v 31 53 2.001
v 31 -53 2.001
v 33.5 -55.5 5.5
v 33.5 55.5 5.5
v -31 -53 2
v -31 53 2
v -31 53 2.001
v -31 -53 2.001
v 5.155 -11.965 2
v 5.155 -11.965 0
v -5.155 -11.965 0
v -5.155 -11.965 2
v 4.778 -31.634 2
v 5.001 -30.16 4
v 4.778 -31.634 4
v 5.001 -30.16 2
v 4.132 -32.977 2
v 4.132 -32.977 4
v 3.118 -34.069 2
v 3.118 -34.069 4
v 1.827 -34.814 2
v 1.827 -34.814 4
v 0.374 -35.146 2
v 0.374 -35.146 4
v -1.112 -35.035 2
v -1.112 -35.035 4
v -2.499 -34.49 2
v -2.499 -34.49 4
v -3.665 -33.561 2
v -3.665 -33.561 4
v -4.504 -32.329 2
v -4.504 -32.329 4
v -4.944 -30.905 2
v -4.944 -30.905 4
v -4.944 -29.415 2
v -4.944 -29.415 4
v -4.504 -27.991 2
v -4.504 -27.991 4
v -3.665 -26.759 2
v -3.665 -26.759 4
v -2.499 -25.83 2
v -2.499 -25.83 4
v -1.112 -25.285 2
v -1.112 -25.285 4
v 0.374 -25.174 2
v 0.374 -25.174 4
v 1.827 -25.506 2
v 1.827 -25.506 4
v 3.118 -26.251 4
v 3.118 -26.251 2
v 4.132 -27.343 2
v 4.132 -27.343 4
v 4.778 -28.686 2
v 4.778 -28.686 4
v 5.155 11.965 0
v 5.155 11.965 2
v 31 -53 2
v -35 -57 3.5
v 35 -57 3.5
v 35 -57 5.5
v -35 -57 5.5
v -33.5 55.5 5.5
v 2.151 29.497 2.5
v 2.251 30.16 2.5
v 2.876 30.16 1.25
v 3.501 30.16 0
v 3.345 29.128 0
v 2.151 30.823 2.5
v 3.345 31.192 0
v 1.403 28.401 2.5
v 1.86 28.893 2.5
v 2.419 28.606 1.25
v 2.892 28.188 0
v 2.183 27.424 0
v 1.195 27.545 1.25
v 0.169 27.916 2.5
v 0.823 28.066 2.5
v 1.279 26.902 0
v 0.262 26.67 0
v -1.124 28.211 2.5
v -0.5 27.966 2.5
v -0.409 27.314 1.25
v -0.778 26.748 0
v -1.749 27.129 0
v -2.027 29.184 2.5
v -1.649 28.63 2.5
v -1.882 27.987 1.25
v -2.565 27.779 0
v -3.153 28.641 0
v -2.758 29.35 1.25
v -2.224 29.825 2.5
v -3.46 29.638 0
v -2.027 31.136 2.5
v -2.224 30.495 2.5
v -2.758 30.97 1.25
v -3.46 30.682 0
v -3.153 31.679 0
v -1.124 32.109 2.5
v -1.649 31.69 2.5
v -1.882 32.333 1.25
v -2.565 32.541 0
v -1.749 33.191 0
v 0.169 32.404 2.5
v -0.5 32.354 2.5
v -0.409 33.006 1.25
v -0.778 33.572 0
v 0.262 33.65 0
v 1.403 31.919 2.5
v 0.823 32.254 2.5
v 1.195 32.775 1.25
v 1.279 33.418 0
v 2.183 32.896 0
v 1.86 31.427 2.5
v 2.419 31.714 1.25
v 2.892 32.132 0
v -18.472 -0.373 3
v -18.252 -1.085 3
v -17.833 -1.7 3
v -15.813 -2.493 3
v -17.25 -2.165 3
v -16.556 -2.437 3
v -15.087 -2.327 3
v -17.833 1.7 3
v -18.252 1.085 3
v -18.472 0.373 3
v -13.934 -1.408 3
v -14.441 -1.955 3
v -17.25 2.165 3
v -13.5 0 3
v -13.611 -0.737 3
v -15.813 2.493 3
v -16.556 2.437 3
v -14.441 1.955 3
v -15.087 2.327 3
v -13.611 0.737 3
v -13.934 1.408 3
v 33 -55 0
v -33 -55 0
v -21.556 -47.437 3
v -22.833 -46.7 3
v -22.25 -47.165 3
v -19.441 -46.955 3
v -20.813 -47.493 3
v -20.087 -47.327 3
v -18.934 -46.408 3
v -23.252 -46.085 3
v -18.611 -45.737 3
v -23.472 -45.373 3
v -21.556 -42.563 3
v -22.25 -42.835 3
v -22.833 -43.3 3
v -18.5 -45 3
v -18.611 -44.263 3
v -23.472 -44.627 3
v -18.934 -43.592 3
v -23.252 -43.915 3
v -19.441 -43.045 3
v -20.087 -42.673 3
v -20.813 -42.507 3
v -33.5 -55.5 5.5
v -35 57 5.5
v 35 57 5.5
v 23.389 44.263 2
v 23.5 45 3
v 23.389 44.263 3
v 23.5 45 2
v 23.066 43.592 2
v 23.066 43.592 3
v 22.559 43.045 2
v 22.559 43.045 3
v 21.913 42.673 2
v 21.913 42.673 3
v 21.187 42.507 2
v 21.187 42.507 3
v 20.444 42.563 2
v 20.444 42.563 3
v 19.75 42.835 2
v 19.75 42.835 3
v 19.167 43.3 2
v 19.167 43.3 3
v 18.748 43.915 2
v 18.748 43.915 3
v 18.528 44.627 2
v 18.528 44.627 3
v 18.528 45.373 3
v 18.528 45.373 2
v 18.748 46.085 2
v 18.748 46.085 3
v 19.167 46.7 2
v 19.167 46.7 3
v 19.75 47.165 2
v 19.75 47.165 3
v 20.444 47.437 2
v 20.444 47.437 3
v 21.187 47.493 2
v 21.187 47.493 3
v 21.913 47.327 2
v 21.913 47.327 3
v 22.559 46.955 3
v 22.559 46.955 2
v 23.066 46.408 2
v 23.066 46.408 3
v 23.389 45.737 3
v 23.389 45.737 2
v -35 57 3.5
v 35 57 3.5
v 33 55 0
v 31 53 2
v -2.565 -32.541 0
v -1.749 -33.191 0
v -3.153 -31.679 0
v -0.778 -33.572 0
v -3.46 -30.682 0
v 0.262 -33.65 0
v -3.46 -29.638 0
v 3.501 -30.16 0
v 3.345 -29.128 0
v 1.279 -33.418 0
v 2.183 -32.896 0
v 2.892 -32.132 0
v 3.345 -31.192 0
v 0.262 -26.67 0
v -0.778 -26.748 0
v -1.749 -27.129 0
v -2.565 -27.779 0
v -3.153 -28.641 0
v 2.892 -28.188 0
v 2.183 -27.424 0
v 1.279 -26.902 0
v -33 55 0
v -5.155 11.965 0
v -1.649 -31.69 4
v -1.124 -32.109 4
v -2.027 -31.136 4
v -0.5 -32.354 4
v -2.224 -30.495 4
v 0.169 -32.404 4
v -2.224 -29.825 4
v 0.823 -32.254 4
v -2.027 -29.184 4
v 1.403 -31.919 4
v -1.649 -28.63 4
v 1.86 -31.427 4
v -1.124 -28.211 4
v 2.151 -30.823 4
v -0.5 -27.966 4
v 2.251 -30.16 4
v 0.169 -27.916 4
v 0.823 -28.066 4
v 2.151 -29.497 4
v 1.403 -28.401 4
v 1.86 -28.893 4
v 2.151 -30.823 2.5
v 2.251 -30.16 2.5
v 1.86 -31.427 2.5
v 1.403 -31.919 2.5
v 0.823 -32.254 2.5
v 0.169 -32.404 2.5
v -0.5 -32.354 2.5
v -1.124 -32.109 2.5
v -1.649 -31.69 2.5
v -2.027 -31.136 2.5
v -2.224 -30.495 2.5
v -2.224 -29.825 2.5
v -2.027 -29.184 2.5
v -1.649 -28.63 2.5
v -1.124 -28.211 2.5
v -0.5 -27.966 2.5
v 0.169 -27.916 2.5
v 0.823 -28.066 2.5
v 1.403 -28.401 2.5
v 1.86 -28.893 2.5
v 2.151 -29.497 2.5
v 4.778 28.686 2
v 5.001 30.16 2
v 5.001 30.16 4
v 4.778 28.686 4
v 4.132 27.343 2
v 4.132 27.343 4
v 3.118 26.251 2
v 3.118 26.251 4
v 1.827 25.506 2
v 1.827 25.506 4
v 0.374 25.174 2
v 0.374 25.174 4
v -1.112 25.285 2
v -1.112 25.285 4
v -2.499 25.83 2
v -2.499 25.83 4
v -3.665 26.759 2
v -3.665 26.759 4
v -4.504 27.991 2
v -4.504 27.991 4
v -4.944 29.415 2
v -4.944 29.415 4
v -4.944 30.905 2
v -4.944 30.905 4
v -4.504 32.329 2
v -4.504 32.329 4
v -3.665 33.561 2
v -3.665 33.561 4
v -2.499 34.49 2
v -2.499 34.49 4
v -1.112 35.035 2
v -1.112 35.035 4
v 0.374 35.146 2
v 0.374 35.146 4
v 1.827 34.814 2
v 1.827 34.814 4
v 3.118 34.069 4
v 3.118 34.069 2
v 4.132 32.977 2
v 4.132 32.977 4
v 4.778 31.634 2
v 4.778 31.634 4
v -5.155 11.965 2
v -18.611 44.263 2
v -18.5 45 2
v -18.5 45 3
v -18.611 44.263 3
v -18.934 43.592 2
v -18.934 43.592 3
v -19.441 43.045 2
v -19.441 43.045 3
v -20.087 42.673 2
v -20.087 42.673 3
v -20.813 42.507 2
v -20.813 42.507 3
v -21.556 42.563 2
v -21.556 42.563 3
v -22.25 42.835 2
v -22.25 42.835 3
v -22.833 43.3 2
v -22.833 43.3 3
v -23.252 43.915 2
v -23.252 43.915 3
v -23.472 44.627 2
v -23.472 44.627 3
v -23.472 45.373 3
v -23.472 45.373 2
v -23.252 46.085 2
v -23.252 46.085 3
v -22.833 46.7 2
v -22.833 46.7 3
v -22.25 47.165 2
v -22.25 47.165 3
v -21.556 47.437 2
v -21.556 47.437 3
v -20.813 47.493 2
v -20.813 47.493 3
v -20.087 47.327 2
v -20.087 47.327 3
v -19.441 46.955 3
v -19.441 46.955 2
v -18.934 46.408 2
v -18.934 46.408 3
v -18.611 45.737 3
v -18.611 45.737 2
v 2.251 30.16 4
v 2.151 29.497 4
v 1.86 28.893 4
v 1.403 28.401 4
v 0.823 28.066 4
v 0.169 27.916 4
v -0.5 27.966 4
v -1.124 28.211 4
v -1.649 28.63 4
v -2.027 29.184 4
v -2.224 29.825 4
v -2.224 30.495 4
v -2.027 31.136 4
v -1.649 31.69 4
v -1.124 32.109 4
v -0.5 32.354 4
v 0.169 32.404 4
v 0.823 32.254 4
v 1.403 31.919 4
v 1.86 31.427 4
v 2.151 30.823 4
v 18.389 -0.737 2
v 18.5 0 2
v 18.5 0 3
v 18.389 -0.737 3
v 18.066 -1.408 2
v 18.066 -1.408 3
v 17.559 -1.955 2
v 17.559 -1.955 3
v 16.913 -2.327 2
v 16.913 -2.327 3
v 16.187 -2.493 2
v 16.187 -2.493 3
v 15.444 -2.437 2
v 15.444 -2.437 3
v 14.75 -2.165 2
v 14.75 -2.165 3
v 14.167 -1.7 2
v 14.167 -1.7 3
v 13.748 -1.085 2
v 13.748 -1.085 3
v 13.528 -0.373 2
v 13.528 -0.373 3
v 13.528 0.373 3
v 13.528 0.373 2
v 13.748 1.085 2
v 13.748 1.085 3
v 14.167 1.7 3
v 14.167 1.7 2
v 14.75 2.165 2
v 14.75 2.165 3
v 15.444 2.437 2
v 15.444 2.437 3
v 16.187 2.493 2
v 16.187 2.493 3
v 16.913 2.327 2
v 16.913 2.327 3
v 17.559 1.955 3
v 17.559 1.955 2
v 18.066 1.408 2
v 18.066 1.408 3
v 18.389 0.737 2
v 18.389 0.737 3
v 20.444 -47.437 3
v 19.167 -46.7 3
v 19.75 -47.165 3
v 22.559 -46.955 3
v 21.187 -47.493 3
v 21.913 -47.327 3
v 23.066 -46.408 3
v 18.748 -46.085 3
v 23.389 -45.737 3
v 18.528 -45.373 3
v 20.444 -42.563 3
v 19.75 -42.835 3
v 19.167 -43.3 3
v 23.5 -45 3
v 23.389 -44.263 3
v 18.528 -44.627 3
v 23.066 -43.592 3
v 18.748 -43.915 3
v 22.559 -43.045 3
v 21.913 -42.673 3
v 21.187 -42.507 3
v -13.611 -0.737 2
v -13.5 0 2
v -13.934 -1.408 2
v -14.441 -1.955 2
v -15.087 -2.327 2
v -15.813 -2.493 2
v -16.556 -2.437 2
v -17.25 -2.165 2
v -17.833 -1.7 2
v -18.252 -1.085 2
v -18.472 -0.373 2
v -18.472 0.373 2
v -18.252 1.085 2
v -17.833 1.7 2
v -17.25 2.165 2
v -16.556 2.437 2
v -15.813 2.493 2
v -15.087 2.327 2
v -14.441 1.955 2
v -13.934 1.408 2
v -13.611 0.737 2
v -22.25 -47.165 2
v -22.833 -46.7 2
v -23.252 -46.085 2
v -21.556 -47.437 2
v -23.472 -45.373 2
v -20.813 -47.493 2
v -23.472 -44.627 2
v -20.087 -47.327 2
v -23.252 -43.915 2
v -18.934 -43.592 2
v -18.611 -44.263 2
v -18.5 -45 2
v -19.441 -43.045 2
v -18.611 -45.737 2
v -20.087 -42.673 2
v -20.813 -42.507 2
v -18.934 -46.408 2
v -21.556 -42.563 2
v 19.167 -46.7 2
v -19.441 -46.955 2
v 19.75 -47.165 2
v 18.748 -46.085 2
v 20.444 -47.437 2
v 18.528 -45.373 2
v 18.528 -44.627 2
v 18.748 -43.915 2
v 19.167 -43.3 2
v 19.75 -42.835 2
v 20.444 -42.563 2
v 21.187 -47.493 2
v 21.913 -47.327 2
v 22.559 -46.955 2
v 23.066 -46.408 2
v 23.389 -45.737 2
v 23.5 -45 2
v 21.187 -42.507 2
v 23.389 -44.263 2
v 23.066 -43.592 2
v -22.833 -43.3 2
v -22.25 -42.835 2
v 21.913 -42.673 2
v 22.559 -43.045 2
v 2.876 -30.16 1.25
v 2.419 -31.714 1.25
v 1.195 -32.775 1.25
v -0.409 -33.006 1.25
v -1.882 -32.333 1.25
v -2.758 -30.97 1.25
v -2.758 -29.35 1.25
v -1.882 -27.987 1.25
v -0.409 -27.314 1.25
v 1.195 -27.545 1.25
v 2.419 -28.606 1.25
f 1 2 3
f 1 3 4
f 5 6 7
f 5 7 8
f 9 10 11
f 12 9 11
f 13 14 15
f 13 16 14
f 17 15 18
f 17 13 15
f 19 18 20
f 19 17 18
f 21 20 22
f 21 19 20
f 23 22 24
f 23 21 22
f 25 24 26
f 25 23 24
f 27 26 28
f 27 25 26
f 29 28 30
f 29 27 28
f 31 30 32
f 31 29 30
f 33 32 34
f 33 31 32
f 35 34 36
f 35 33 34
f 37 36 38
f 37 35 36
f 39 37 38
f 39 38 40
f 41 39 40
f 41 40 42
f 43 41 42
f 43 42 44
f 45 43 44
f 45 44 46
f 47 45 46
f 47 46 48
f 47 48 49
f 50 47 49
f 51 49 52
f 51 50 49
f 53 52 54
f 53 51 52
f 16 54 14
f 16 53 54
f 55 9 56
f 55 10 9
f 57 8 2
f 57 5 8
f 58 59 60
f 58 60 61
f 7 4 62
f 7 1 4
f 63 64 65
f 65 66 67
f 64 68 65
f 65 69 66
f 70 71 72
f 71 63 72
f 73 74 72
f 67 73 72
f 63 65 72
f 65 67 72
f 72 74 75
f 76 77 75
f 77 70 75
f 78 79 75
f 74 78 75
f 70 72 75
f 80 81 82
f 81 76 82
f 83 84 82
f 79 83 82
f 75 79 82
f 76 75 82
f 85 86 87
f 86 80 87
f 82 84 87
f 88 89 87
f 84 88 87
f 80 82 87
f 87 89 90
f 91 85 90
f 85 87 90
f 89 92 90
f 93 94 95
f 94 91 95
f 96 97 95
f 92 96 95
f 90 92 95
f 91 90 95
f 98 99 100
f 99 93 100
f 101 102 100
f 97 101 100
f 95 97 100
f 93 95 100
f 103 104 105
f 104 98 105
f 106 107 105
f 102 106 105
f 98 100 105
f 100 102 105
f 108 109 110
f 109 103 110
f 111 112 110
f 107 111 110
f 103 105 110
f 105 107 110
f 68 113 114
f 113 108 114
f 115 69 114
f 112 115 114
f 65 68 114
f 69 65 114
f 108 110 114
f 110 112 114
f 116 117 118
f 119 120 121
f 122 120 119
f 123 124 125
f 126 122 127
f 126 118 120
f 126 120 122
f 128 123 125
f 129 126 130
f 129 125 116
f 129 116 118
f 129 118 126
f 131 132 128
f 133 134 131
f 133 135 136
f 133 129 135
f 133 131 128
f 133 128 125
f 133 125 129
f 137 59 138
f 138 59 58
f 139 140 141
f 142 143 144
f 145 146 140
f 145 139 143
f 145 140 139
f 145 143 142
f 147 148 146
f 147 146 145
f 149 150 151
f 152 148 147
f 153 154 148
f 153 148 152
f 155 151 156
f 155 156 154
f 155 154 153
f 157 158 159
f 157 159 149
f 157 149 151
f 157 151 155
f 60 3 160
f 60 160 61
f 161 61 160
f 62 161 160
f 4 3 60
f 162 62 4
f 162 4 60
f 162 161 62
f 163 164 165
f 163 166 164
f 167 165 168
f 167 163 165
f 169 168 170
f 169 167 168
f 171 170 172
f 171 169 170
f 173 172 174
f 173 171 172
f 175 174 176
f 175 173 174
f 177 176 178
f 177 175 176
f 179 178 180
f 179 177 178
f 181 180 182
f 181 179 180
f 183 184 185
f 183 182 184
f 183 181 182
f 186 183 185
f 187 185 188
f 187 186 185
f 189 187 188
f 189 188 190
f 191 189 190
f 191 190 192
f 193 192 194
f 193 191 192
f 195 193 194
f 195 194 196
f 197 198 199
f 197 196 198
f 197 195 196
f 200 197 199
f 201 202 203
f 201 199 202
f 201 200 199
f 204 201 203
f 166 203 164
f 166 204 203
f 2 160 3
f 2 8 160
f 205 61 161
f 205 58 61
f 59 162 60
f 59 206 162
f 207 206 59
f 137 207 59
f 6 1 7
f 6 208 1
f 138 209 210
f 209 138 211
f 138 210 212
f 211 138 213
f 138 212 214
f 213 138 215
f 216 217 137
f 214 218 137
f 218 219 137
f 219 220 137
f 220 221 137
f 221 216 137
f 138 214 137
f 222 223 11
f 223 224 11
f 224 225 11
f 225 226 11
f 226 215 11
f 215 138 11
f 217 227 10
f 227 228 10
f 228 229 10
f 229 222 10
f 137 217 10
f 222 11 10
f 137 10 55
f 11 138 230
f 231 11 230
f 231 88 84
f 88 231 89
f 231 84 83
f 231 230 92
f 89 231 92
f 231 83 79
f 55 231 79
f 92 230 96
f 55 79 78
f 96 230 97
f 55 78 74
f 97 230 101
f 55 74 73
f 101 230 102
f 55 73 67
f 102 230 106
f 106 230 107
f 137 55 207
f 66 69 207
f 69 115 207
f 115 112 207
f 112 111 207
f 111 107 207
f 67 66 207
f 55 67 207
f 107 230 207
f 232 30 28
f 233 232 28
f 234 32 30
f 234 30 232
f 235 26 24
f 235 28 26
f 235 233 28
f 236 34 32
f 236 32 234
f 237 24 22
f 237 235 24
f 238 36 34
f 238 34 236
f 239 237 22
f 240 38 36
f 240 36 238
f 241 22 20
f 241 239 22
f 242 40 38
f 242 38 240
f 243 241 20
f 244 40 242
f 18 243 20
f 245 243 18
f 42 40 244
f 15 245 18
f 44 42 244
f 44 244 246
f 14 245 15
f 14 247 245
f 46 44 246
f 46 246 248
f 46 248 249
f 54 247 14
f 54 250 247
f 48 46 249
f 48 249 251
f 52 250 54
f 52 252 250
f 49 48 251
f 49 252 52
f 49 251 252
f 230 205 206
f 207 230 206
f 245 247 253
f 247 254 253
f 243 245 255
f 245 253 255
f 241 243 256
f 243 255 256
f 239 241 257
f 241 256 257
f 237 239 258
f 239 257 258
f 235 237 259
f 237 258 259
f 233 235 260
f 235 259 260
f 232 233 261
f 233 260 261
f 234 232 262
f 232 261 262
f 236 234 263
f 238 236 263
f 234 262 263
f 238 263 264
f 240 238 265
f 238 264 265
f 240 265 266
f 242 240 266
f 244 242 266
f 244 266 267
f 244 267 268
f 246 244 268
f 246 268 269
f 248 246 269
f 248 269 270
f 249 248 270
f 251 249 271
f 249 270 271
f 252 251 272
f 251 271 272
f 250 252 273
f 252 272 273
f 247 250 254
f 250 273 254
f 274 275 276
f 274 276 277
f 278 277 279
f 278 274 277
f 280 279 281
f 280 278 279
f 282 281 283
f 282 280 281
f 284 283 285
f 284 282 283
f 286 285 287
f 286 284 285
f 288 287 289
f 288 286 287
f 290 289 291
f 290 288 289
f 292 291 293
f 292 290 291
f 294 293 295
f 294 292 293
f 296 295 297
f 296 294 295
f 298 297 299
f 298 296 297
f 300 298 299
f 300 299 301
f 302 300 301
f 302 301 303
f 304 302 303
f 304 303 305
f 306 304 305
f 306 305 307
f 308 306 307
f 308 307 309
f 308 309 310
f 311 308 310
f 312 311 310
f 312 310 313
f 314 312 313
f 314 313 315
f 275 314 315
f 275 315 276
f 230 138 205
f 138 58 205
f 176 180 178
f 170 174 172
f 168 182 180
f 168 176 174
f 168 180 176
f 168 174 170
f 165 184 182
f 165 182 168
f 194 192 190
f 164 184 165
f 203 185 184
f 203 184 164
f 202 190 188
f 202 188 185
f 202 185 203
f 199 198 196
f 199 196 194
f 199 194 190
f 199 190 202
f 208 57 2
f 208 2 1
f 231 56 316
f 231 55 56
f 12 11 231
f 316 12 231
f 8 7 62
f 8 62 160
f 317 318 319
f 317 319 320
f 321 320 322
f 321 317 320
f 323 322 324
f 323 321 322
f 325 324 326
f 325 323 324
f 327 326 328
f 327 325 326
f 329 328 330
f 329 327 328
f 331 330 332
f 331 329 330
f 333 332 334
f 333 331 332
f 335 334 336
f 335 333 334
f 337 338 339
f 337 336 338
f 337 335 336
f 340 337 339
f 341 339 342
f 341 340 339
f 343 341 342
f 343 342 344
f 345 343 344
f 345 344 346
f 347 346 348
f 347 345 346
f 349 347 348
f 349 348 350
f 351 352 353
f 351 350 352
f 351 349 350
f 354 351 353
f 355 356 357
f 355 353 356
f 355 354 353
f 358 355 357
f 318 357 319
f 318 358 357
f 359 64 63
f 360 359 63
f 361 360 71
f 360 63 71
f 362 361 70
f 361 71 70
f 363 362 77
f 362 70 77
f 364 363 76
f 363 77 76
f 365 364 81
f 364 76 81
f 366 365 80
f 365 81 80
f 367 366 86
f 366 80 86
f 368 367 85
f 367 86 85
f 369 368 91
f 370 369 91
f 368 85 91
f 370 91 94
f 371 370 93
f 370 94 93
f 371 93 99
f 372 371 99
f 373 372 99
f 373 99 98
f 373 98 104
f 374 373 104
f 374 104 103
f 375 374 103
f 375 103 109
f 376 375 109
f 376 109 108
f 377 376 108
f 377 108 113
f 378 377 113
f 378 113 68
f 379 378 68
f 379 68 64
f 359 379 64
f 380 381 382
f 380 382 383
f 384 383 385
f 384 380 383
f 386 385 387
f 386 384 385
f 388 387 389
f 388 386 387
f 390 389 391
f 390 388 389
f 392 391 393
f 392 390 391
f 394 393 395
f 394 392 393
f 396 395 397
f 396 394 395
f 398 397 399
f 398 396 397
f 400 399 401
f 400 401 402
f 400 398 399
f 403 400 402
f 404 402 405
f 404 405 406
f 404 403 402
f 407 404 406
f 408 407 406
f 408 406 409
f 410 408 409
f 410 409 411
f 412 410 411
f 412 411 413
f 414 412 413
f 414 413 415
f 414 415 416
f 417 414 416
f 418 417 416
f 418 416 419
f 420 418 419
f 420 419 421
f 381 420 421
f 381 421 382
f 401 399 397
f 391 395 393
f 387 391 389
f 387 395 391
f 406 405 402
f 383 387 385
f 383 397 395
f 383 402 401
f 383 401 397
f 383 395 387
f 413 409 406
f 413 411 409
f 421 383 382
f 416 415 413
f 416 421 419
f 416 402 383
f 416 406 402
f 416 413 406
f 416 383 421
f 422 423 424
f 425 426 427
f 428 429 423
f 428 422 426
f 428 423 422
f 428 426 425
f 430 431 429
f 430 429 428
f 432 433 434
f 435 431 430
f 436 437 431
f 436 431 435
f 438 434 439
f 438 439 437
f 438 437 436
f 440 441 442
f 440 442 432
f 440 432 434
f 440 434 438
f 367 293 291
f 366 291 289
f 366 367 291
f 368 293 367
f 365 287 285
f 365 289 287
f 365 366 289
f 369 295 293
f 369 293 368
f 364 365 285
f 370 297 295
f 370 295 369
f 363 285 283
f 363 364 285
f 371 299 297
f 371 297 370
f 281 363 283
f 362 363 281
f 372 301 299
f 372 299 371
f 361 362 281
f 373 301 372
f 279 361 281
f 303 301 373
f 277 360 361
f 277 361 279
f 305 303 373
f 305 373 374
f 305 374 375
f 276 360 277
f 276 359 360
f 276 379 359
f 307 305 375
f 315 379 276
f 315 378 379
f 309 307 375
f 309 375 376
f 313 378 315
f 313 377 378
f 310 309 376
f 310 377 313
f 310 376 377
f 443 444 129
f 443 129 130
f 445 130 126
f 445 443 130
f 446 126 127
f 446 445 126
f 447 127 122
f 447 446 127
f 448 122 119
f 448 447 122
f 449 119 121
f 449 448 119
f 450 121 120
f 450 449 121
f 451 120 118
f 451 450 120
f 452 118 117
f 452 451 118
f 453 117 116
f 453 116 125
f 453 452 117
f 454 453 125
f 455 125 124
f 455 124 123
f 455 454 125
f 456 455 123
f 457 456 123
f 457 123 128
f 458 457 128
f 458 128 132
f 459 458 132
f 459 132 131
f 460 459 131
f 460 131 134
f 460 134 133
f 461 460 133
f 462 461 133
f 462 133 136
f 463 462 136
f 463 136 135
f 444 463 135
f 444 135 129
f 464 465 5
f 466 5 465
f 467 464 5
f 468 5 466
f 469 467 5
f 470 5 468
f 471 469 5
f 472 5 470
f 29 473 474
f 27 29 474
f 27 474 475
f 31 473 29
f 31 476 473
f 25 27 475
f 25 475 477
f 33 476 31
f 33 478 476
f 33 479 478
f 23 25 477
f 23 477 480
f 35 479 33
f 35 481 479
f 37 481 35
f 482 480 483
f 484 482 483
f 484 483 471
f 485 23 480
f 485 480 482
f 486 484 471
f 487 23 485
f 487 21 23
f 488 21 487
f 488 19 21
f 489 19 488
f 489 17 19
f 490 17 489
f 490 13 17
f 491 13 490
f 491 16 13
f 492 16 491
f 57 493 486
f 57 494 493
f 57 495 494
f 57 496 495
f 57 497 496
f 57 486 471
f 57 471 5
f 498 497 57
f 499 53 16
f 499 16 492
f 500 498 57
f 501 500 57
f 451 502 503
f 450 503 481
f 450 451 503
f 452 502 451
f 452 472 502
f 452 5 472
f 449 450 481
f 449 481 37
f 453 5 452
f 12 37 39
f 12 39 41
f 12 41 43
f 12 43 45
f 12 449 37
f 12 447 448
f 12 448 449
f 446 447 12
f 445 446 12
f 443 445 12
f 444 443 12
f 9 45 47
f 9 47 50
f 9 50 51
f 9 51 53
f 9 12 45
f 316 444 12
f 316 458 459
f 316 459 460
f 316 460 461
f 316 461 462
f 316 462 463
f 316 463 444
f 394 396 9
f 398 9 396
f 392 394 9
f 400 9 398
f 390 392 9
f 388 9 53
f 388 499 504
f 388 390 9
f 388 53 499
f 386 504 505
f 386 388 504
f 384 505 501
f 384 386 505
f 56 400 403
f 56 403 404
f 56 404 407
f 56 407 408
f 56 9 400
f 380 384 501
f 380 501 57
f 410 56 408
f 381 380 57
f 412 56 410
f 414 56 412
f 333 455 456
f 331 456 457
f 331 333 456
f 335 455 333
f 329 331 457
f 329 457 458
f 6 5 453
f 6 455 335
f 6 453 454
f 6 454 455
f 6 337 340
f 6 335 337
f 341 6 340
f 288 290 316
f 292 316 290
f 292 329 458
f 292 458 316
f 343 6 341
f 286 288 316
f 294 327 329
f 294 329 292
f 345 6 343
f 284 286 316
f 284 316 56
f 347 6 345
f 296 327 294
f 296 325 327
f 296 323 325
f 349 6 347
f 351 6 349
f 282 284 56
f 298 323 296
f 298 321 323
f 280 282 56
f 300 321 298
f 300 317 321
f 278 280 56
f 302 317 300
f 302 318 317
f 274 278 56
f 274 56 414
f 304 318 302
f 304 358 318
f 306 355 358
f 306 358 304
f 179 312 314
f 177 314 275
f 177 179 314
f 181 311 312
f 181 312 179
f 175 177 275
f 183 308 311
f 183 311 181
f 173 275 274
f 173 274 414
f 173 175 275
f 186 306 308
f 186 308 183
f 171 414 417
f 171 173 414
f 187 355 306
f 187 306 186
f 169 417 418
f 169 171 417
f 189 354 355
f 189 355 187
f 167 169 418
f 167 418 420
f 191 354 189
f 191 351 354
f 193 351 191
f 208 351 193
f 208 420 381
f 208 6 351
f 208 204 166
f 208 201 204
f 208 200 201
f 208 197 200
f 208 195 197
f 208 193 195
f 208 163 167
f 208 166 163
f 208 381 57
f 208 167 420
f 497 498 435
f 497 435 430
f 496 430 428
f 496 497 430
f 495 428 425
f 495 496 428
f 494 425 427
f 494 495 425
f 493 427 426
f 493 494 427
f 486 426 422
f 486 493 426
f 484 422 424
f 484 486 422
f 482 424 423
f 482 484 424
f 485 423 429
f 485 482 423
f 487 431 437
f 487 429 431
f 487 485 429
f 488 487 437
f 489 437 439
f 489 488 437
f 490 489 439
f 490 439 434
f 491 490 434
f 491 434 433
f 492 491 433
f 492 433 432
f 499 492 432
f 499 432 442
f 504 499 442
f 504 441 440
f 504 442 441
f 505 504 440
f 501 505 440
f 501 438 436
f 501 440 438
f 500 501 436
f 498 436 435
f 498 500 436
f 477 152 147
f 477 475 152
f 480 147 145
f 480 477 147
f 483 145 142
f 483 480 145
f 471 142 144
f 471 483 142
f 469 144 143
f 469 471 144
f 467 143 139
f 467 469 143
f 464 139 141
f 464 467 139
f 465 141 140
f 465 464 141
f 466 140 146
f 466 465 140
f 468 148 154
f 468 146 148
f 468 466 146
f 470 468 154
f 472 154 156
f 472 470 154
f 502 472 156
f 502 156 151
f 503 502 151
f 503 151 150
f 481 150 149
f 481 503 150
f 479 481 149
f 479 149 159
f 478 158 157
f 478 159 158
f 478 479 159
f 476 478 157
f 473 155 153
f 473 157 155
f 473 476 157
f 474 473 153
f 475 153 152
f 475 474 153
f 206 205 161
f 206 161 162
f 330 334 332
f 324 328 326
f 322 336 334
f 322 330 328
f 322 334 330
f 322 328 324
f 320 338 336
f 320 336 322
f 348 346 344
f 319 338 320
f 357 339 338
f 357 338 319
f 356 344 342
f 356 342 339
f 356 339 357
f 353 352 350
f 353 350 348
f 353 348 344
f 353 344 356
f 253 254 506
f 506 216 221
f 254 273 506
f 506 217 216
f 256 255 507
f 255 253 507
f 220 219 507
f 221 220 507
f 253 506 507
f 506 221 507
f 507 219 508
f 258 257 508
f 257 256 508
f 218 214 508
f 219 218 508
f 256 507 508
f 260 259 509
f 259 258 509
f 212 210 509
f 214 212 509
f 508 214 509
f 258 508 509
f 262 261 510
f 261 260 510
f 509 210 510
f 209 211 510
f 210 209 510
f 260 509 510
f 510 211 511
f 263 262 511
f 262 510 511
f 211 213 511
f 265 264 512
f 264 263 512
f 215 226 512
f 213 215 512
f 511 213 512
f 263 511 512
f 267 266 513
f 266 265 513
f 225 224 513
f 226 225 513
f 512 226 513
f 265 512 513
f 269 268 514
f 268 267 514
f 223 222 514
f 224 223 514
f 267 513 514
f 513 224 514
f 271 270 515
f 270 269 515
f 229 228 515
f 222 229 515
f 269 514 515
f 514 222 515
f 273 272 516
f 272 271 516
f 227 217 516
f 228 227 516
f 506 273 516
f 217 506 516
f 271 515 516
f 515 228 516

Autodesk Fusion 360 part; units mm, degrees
sketch "Sketch1" plane through (0, 0, 0) normal (0, 0, 1) x (1, 0, 0)
  line L0 (-35, 57) -> (35, 57)
  line L1 (35, 57) -> (35, -57)
  line L2 (35, -57) -> (-35, -57)
  line L3 (-35, -57) -> (-35, 57)
  line L4 (-50, 0) -> (50, 0)
  circle A0 centre (0.0006, 30.16) radius 3.5
  circle A1 centre (0.0006, -30.16) radius 3.5
  line L5 (0, 65) -> (0, -65)
  line L6 (5.155, 0) -> (5.155, 11.965)
  line L7 (5.155, 11.965) -> (0, 11.965)
  line L8 (-5.155, 11.965) -> (0, 11.965)
  line L9 (-5.155, 0) -> (-5.155, 11.965)
  line L10 (-5.155, 0) -> (-5.155, -11.965)
  line L11 (5.155, -11.965) -> (0, -11.965)
  line L12 (5.155, 0) -> (5.155, -11.965)
  line L13 (-5.155, -11.965) -> (0, -11.965)
  circle A2 centre (0.0006, 30.16) radius 2.25
  circle A3 centre (0.0006, -30.16) radius 2.25
  circle A4 centre (0.0006, 30.16) radius 5
  circle A5 centre (0.0006, -30.16) radius 5
  circle A6 centre (21, 45) radius 2.5
  circle A7 centre (-21, 45) radius 2.5
  circle A8 centre (21, -45) radius 2.5
  circle A9 centre (-21, -45) radius 2.5
  circle A10 centre (16, 0) radius 2.5
  circle A11 centre (-16, 0) radius 2.5
  line L14 (31, 53) -> (-31, 53)
  line L15 (-31, 53) -> (-31, -53)
  line L16 (-31, -53) -> (31, -53)
  line L17 (31, -53) -> (31, 53)
  dimension "d1" = 60.32
  dimension "d3" = 10.31
  dimension "d4" = 23.93
  dimension "d5" = 4.5
  dimension "d6" = 10
  dimension "d7" = 5
  dimension "d8" = 114
  dimension "d9" = 5
  dimension "d24" = 7
extrude "Extrude1" add sketch "Sketch1" along normal blind 5.5 contours L0 L3 L4 L5 L14 L15 | L0 L1 L4 L5 L14 L17 | L2 L3 L4 L5 L15 L16 | L1 L2 L4 L5 L16 L17 makes body 1
extrude "Extrude2" add sketch "Sketch1" along normal blind 3 separate body contours L4 A11 | L4 A11 | L4 A10 | L4 A10 | A6 | A7 | A8 | A9 makes body 2 at (23.4969, -45.1246, 2) makes body 3 at (-13.5124, -0.2489, 1) makes body 4 at (-18.5031, 44.8754, 2) makes body 5 at (-18.5031, -45.1246, 2) makes body 6 at (18.4876, -0.2489, 1) makes body 7 at (23.4969, 44.8754, 2)
extrude "Extrude3" add sketch "Sketch1" along normal blind 2 contours L4 L5 L6 L7 A4 A10 L14 L17 | L4 L5 L8 L9 A4 A11 L14 L15 | L4 L5 L10 L13 A5 A11 L15 L16 | L4 L5 L11 L12 A5 A10 L16 L17 bodies 1 2 3 4 5 6 7
chamfer "Chamfer1" distance 2.5 distance2 3.5 4 edges at (-31, 0, 5.5) (0, 53, 5.5) (31, 0, 5.5) (0, -53, 5.5) measured on face at (33.6667, -17.6667, 5.5) measured on face at (33.6667, -17.6667, 5.5) measured on face at (33.6667, -17.6667, 5.5) measured on face at (33.6667, -17.6667, 5.5) on bodies 1
chamfer "Chamfer2" distance 2 distance2 3.5 4 edges at (35, 0, 0) (0, -57, 0) (-35, 0, 0) (0, 57, 0) measured on face at (-25.0517, 3.9883, 0) measured on face at (-25.0517, 3.9883, 0) measured on face at (-25.0517, 3.9883, 0) measured on face at (-25.0517, 3.9883, 0) on bodies 1
extrude "Extrude4" add sketch "Sketch1" along normal blind 4 contours A0 L5 A4 | A0 L5 A4 | A0 L5 A2 | A0 L5 A2 | A1 L5 A5 | A1 L5 A5 | A1 L5 A3 | A1 L5 A3 bodies 1
chamfer "Chamfer3" distance 2.5 distance2 1.25 2 edges at (-2.0971, -29.3464, 0) (-2.0971, 30.9736, 0) measured on face at (2.2394, -29.936, 2.6667) measured on face at (2.2394, 30.384, 1.3333) on bodies 1
